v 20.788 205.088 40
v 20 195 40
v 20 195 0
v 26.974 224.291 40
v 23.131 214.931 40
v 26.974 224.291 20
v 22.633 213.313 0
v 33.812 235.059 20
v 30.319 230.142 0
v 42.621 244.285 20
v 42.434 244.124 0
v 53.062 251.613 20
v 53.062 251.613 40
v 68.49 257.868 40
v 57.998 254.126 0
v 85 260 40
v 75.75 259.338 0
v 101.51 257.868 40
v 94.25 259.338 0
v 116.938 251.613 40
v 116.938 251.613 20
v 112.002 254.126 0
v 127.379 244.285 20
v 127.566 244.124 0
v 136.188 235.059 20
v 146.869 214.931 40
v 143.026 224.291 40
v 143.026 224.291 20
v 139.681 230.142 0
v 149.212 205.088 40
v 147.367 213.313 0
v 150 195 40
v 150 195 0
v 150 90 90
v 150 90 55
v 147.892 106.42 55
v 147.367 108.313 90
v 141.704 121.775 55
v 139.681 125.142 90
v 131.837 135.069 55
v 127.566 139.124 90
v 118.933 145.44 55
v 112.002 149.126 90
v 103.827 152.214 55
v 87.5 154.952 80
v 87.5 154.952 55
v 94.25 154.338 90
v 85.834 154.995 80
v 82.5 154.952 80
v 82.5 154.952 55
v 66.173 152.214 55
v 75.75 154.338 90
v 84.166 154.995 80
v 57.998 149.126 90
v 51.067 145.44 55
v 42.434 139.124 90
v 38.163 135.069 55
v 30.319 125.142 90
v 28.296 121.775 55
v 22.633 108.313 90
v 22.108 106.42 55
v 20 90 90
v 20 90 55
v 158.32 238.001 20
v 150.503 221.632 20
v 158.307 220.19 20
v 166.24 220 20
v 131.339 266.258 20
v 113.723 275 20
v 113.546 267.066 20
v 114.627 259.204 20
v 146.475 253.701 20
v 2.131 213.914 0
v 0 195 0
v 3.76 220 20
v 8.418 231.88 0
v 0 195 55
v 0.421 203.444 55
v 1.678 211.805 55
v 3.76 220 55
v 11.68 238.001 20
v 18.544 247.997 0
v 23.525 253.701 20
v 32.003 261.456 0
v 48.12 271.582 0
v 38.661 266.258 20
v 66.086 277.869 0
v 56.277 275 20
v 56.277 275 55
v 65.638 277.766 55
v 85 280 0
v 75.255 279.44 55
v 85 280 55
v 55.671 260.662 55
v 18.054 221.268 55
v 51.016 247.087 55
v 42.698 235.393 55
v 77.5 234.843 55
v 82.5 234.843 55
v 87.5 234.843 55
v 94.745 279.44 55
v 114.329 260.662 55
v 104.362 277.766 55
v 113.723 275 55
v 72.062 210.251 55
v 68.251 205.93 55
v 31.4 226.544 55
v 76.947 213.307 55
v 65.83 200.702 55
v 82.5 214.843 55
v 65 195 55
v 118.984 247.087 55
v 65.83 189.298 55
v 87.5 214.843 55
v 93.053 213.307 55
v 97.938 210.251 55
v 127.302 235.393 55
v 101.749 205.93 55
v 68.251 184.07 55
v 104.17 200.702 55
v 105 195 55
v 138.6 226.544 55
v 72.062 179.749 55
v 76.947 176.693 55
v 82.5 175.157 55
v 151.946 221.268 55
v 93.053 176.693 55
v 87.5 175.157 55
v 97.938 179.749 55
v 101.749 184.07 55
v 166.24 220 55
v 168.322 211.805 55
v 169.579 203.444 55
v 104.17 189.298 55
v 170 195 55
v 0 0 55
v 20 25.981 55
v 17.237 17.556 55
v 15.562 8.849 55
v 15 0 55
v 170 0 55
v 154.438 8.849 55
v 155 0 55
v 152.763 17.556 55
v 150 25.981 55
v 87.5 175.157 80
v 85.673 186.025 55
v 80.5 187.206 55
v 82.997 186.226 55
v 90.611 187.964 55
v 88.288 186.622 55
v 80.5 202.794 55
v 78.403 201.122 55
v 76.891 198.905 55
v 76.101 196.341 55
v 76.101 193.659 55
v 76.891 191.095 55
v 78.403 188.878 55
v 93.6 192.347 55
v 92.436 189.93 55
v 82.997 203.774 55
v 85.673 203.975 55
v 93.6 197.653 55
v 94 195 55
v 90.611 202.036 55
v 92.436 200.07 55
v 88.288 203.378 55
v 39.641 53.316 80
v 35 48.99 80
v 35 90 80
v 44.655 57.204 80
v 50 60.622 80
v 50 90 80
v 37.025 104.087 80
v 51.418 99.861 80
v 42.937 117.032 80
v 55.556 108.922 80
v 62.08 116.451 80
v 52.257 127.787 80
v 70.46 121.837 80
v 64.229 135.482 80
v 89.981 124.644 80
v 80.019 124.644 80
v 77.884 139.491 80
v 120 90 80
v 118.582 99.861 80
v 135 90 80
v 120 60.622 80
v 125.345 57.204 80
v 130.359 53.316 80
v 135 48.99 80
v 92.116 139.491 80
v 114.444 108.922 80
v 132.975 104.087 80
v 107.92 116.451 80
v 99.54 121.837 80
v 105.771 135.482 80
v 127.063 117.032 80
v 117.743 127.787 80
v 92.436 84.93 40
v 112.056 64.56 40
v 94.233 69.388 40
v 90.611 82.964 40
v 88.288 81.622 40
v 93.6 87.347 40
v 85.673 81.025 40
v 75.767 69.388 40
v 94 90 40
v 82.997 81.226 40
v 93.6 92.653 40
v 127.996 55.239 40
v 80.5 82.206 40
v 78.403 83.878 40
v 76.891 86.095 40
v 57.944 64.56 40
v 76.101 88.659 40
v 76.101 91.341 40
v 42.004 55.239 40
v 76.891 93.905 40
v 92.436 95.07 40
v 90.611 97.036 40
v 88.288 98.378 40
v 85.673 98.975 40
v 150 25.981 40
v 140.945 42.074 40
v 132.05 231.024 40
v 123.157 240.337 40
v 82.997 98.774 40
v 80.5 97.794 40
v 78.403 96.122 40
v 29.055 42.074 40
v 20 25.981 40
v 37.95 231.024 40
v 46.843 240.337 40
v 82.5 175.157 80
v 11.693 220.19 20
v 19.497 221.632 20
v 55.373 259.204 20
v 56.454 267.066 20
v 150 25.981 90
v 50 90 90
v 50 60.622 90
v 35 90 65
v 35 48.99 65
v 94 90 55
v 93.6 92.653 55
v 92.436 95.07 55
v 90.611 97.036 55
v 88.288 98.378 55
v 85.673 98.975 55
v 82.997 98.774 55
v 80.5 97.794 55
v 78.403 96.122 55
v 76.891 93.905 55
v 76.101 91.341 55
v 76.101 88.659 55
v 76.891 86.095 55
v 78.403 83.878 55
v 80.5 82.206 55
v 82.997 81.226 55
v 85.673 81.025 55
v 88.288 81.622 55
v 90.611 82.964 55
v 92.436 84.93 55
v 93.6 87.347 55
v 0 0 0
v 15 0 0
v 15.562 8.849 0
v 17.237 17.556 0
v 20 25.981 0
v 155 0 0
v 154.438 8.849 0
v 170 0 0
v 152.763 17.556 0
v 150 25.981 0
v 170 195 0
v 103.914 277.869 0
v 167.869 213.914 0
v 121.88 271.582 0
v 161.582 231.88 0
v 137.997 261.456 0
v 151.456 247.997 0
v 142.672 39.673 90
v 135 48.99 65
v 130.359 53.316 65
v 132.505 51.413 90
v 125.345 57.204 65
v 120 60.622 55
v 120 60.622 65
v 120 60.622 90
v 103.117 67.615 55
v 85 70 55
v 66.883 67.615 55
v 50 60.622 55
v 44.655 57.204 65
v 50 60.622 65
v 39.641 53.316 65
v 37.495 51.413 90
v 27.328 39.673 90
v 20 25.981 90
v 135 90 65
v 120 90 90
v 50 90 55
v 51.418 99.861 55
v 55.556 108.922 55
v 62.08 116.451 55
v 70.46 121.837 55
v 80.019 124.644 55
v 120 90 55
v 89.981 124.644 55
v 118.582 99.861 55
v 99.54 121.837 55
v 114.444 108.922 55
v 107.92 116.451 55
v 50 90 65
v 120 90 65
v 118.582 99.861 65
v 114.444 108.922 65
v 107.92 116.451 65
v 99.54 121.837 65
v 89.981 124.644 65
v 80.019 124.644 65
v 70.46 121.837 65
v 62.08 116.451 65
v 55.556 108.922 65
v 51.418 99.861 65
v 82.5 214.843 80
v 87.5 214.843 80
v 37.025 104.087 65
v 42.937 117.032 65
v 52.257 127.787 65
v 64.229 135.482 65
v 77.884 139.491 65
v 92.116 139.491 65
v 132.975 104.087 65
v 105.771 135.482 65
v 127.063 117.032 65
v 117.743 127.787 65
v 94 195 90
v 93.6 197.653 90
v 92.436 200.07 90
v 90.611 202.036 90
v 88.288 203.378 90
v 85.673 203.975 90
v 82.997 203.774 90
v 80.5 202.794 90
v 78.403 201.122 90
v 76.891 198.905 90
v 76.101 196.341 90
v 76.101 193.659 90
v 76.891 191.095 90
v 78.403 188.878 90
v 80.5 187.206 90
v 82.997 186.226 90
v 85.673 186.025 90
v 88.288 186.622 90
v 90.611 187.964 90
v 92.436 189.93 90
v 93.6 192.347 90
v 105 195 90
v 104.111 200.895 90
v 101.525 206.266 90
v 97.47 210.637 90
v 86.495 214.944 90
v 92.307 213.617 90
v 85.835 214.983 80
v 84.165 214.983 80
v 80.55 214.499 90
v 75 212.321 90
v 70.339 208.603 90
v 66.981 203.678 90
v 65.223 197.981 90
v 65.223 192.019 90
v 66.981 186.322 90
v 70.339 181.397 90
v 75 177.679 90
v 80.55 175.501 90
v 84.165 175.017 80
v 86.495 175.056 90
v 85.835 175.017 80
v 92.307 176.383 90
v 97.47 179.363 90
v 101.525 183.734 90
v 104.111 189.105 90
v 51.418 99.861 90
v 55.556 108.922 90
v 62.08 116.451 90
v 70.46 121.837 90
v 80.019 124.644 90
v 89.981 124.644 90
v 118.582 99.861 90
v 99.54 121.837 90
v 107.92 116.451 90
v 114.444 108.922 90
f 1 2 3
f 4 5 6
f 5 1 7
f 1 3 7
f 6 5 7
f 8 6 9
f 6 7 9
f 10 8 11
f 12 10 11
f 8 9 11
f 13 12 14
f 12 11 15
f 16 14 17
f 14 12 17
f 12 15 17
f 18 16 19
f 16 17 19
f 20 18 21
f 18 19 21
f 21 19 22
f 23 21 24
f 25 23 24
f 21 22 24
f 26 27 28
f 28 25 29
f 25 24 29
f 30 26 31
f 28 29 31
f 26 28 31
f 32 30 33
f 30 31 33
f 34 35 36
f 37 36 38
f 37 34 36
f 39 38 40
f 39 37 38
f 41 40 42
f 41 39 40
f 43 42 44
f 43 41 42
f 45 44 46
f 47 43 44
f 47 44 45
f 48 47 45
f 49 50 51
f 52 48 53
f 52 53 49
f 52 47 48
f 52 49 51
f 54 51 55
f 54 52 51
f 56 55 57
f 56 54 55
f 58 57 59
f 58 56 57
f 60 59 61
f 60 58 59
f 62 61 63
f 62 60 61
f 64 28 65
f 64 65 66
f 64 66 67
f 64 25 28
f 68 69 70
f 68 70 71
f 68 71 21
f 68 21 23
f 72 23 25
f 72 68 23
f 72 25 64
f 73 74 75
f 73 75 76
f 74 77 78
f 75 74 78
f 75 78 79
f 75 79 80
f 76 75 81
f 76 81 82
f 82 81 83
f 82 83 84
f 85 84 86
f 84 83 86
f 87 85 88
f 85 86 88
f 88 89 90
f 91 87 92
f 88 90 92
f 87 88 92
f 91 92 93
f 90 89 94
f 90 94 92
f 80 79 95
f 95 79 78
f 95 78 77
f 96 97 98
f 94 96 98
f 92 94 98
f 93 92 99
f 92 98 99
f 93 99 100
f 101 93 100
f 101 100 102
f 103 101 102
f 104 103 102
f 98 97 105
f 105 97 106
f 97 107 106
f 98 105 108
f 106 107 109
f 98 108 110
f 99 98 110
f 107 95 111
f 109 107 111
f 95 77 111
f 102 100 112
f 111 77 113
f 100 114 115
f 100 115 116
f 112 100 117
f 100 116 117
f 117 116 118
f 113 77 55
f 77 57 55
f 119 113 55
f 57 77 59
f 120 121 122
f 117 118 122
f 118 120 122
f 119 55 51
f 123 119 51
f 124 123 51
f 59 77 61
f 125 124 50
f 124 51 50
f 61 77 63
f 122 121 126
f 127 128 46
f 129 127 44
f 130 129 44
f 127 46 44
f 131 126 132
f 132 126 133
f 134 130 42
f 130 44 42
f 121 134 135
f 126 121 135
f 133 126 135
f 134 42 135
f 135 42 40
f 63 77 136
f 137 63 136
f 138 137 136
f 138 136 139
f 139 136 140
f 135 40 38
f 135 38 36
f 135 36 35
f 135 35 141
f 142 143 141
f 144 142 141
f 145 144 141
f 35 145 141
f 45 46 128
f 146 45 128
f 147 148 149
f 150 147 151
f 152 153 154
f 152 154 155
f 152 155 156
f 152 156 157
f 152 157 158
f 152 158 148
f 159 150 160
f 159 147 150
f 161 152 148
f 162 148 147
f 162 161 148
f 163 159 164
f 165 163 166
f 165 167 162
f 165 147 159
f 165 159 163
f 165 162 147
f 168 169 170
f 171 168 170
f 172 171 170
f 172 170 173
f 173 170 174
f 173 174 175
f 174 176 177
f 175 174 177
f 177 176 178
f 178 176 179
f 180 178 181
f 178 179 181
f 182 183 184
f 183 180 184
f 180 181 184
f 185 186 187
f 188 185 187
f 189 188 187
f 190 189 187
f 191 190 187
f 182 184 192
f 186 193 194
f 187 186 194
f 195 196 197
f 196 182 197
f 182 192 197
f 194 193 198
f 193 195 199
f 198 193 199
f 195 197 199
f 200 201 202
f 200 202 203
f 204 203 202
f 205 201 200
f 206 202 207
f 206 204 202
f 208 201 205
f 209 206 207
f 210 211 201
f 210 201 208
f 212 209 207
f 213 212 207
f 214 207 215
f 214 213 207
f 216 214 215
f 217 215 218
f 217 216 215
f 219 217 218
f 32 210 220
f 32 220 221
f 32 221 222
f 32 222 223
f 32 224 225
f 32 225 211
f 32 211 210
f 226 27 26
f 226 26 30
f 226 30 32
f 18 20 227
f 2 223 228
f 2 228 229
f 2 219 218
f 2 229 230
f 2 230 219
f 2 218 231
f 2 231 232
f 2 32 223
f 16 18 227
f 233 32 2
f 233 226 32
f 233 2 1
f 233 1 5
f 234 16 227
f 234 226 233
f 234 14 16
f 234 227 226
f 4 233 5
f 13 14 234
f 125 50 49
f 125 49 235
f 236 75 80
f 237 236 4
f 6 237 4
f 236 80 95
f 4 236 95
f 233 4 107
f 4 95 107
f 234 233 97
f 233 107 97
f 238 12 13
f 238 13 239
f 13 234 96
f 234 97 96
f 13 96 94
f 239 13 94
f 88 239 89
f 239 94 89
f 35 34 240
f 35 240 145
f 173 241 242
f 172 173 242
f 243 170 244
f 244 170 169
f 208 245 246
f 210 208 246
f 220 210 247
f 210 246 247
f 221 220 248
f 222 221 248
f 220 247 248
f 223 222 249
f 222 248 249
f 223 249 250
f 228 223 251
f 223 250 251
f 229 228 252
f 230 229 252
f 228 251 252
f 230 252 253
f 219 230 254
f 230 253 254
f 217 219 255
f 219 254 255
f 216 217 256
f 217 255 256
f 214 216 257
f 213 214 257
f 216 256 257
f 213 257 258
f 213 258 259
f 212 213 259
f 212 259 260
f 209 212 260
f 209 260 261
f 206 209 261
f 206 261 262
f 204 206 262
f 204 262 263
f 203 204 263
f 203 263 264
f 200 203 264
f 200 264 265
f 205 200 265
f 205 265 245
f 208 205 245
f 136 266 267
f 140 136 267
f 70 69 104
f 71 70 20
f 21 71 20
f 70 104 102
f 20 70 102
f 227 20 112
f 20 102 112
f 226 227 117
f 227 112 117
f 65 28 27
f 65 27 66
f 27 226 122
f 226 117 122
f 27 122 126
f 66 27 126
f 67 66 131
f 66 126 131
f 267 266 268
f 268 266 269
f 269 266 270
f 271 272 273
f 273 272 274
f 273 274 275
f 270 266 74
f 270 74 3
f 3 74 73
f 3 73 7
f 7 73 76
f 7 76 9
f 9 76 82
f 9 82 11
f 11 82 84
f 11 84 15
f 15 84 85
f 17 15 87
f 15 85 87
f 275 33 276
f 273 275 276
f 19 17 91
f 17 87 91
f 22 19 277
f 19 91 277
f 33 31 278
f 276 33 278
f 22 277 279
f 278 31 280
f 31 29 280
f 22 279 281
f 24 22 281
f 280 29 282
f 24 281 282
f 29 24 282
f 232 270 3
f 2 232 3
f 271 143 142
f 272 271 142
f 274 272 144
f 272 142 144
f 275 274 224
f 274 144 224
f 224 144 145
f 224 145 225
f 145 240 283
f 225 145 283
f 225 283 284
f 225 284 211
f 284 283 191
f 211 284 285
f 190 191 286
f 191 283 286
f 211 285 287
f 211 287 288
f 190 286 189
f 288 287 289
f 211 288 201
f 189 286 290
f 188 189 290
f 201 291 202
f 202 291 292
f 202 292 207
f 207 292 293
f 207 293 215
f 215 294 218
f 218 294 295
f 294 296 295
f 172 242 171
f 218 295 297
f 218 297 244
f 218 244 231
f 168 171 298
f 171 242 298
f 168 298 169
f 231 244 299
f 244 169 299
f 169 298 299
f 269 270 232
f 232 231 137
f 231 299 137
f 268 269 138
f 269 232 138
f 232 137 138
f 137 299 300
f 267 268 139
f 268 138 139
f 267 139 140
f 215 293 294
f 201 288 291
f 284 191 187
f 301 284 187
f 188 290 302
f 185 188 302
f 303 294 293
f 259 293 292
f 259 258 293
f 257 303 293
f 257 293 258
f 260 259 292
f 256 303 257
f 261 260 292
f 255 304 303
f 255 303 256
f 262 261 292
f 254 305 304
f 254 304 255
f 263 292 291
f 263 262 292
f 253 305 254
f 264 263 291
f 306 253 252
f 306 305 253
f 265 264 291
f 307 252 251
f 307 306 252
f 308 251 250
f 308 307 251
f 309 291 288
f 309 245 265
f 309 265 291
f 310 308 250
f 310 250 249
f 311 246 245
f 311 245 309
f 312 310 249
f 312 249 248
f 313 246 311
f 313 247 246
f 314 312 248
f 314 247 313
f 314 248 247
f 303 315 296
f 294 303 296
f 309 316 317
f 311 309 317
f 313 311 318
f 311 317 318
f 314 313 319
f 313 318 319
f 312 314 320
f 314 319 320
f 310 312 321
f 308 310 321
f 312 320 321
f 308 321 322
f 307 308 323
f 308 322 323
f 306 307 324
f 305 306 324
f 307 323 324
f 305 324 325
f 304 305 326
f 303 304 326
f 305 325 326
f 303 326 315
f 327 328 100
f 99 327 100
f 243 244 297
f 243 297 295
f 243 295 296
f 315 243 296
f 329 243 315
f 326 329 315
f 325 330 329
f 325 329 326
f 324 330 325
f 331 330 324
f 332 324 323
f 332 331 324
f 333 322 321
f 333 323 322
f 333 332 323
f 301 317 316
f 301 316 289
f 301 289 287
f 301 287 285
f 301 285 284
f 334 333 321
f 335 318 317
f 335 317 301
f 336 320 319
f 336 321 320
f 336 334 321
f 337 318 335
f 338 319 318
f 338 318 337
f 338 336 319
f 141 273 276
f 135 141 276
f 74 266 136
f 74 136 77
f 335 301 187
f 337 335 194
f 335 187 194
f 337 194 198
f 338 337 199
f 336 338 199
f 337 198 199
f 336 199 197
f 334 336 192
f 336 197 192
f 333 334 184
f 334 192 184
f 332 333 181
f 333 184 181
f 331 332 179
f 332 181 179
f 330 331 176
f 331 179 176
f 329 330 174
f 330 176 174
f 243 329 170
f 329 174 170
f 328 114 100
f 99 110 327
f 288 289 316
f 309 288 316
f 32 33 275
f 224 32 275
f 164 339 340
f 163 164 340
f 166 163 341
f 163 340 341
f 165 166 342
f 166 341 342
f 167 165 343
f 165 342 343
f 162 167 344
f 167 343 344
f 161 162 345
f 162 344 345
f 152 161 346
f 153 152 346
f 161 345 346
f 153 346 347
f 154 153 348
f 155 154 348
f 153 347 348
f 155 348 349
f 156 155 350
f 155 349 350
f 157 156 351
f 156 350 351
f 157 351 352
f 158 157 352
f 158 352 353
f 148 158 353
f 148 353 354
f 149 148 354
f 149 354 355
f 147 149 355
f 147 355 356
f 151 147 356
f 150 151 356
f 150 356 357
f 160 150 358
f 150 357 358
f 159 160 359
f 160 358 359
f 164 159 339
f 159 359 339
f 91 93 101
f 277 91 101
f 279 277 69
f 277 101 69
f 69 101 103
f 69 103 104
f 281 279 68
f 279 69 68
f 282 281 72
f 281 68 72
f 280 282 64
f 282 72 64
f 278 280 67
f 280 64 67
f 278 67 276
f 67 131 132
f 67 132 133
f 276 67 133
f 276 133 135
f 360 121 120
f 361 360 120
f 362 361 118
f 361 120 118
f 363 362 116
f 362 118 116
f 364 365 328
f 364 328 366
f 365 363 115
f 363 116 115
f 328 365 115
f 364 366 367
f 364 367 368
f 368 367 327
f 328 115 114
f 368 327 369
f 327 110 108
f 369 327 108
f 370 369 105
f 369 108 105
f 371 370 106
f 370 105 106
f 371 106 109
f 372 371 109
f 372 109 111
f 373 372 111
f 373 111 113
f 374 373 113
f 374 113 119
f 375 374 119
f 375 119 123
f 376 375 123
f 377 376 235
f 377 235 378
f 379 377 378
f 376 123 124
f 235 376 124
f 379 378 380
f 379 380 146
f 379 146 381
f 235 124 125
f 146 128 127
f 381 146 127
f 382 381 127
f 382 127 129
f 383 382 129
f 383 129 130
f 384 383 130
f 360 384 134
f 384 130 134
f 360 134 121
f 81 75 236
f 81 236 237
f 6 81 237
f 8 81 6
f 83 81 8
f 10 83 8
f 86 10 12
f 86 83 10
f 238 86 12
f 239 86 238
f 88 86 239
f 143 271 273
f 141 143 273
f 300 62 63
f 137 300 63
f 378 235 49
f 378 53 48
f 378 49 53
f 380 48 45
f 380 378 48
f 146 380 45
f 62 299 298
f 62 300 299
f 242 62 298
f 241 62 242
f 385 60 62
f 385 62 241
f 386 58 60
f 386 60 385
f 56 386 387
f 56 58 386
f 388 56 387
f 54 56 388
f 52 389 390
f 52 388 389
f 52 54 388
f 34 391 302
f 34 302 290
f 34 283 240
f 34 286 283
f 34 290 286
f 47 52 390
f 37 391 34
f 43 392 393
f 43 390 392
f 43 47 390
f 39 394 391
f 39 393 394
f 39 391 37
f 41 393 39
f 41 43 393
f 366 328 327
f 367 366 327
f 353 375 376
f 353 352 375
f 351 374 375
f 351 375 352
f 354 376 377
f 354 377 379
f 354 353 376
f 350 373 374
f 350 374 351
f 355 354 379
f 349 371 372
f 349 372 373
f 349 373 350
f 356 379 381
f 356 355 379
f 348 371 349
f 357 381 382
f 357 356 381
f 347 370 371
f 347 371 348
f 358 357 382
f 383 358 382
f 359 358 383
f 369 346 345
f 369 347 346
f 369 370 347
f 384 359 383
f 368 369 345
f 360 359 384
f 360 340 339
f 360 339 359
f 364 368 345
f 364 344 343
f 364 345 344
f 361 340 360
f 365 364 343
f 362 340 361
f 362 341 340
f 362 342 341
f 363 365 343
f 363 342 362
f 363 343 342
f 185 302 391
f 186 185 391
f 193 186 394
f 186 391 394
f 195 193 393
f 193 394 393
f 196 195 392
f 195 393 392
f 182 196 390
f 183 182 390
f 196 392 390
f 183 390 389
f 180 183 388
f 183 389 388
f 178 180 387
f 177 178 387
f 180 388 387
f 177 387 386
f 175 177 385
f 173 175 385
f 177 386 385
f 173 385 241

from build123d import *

# Parameters (mm, degrees)
SKETCH1_W           = 170
SKETCH1_H           = 280
BOSS_EXTRUDE1_DEPTH = 90
CUT_EXTRUDE1_DEPTH  = 90
CUT_EXTRUDE2_DEPTH  = 90
SKETCH4_W           = 20
SKETCH4_H           = 35
CUT_EXTRUDE3_DEPTH  = 299
CUT_EXTRUDE4_DEPTH  = 40
SKETCH6_R           = 9
CUT_EXTRUDE5_DEPTH  = 50
CUT_EXTRUDE6_DEPTH  = 35
SKETCH8_R           = 9
CUT_EXTRUDE7_DEPTH  = 35
CUT_EXTRUDE9_DEPTH  = 15
SKETCH10_R          = 20
BOSS_EXTRUDE2_DEPTH = 35
SKETCH11_R          = 9
CUT_EXTRUDE10_DEPTH = 35
SKETCH12_W          = 5
SKETCH12_H          = 20
SKETCH12_H_2        = 20.204959883
BOSS_EXTRUDE3_DEPTH = 25
CUT_EXTRUDE11_DEPTH = 35
CUT_EXTRUDE12_DEPTH = 10


with BuildPart() as part:
    # Sketch1 → Boss-Extrude1 (new body)
    with BuildSketch(Plane.XY):
        with Locations((85, 140)):
            Rectangle(SKETCH1_W, SKETCH1_H)
    extrude(amount=BOSS_EXTRUDE1_DEPTH)

    # Sketch2 → Cut-Extrude1 (cut)
    with BuildSketch(Plane.XY.offset(90)):
        with BuildLine():
            Line((0, 280), (0, 195))
            ThreePointArc((0, 195), (24.895923599, 255.104076401), (85, 280))
            Line((85, 280), (0, 280))
        make_face()
        with BuildLine():
            Line((170, 280), (85, 280))
            ThreePointArc((85, 280), (145.104076401, 255.104076401), (170, 195))
            Line((170, 195), (170, 280))
        make_face()
    extrude(amount=-CUT_EXTRUDE1_DEPTH, mode=Mode.SUBTRACT)

    # Sketch3 → Cut-Extrude2 (cut)
    with BuildSketch(Plane.XY.offset(90)):
        with BuildLine():
            Line((15, 0), (155, 0))
            ThreePointArc((155, 0), (85, 70), (15, 0))
        make_face()
    extrude(amount=-CUT_EXTRUDE2_DEPTH, mode=Mode.SUBTRACT)

    # Sketch4 → Cut-Extrude3 (cut)
    with BuildSketch(Plane(origin=(0, 0, 0), x_dir=(1, 0, 0), z_dir=(0, 1, 0))):
        with Locations((10, -72.5)):
            Rectangle(SKETCH4_W, SKETCH4_H)
        with Locations((160, -72.5)):
            Rectangle(SKETCH4_W, SKETCH4_H)
    extrude(amount=CUT_EXTRUDE3_DEPTH, mode=Mode.SUBTRACT)

    # Sketch5 → Cut-Extrude4 (cut)
    with BuildSketch(Plane(origin=(0, 0, 0), x_dir=(-1, 0, 0), z_dir=(0, 0, -1))):
        with BuildLine():
            Line((-20, 25.980762114), (-20, 195))
            ThreePointArc((-20, 195), (-85, 260), (-150, 195))
            Line((-150, 195), (-150, 25.980762114))
            ThreePointArc((-150, 25.980762114), (-85, 70), (-20, 25.980762114))
        make_face()
    extrude(amount=-CUT_EXTRUDE4_DEPTH, mode=Mode.SUBTRACT)

    # Sketch6 → Cut-Extrude5 (cut)
    with BuildSketch(Plane.XY.offset(90)):
        with Locations((85, 90)):
            Circle(SKETCH6_R)
    extrude(amount=-CUT_EXTRUDE5_DEPTH, mode=Mode.SUBTRACT)

    # Sketch7 → Cut-Extrude6 (cut)
    with BuildSketch(Plane.XY.offset(90)):
        with BuildLine():
            Line((20, 90), (20, 249.772255751))
            ThreePointArc((20, 249.772255751), (85, 280), (150, 249.772255751))
            Line((150, 249.772255751), (150, 90))
            ThreePointArc((150, 90), (85, 155), (20, 90))
        make_face()
    extrude(amount=-CUT_EXTRUDE6_DEPTH, mode=Mode.SUBTRACT)

    # Sketch8 → Cut-Extrude7 (cut)
    with BuildSketch(Plane.XY.offset(90)):
        with BuildLine():
            ThreePointArc((120, 90), (85, 125), (50, 90))
            Line((50, 90), (50, 60.621778265))
            ThreePointArc((50, 60.621778265), (85, 70), (120, 60.621778265))
            Line((120, 60.621778265), (120, 90))
        make_face()
        with Locations((85, 90)):
            Circle(SKETCH8_R, mode=Mode.SUBTRACT)
    extrude(amount=-CUT_EXTRUDE7_DEPTH, mode=Mode.SUBTRACT)

    # Sketch9 → Cut-Extrude9 (cut)
    with BuildSketch(Plane.XY.offset(80)):
        with BuildLine():
            Line((35, 90), (50, 90))
            ThreePointArc((50, 90), (85, 125), (120, 90))
            Line((120, 90), (135, 90))
            ThreePointArc((135, 90), (85, 140), (35, 90))
        make_face()
        with BuildLine():
            Line((50, 90), (35, 90))
            Line((35, 90), (35, 48.989794856))
            ThreePointArc((35, 48.989794856), (85, 70), (135, 48.989794856))
            Line((135, 48.989794856), (135, 90))
            Line((135, 90), (120, 90))
            ThreePointArc((120, 90), (85, 125), (50, 90))
        make_face()
    extrude(amount=-CUT_EXTRUDE9_DEPTH, mode=Mode.SUBTRACT)

    # Sketch10 → Boss-Extrude2 (add)
    with BuildSketch(Plane.XY.offset(55)):
        with Locations((85, 195)):
            Circle(SKETCH10_R)
    extrude(amount=BOSS_EXTRUDE2_DEPTH)

    # Sketch11 → Cut-Extrude10 (cut)
    with BuildSketch(Plane.XY.offset(90)):
        with Locations((85, 195)):
            Circle(SKETCH11_R)
    extrude(amount=-CUT_EXTRUDE10_DEPTH, mode=Mode.SUBTRACT)

    # Sketch12 → Boss-Extrude3 (add)
    with BuildSketch(Plane.XY.offset(55)):
        with Locations((85, 224.843134833)):
            Rectangle(SKETCH12_W, SKETCH12_H)
        with Locations((85, 165.054385226)):
            Rectangle(SKETCH12_W, SKETCH12_H_2)
    extrude(amount=BOSS_EXTRUDE3_DEPTH)

    # Sketch13 → Cut-Extrude11 (cut)
    with BuildSketch(Plane.XY.offset(55)):
        with BuildLine():
            ThreePointArc((3.759615954, 220), (42.697632957, 235.393046487), (56.277186767, 275))
            ThreePointArc((56.277186767, 275), (23.524588745, 253.700713889), (3.759615954, 220))
        make_face()
        with BuildLine():
            ThreePointArc((166.240384046, 220), (146.475411255, 253.700713889), (113.722813233, 275))
            ThreePointArc((113.722813233, 275), (127.302367043, 235.393046487), (166.240384046, 220))
        make_face()
    extrude(amount=-CUT_EXTRUDE11_DEPTH, mode=Mode.SUBTRACT)

    # Sketch14 → Cut-Extrude12 (cut)
    with BuildSketch(Plane(origin=(87.5, 0, 0), x_dir=(0, 0, -1), z_dir=(1, 0, 0))):
        Polygon((-80, 214.843134833), (-55, 234.843134833), (-80, 234.843134833), align=None)
    extrude(amount=-CUT_EXTRUDE12_DEPTH, mode=Mode.SUBTRACT)


solid = part.part
